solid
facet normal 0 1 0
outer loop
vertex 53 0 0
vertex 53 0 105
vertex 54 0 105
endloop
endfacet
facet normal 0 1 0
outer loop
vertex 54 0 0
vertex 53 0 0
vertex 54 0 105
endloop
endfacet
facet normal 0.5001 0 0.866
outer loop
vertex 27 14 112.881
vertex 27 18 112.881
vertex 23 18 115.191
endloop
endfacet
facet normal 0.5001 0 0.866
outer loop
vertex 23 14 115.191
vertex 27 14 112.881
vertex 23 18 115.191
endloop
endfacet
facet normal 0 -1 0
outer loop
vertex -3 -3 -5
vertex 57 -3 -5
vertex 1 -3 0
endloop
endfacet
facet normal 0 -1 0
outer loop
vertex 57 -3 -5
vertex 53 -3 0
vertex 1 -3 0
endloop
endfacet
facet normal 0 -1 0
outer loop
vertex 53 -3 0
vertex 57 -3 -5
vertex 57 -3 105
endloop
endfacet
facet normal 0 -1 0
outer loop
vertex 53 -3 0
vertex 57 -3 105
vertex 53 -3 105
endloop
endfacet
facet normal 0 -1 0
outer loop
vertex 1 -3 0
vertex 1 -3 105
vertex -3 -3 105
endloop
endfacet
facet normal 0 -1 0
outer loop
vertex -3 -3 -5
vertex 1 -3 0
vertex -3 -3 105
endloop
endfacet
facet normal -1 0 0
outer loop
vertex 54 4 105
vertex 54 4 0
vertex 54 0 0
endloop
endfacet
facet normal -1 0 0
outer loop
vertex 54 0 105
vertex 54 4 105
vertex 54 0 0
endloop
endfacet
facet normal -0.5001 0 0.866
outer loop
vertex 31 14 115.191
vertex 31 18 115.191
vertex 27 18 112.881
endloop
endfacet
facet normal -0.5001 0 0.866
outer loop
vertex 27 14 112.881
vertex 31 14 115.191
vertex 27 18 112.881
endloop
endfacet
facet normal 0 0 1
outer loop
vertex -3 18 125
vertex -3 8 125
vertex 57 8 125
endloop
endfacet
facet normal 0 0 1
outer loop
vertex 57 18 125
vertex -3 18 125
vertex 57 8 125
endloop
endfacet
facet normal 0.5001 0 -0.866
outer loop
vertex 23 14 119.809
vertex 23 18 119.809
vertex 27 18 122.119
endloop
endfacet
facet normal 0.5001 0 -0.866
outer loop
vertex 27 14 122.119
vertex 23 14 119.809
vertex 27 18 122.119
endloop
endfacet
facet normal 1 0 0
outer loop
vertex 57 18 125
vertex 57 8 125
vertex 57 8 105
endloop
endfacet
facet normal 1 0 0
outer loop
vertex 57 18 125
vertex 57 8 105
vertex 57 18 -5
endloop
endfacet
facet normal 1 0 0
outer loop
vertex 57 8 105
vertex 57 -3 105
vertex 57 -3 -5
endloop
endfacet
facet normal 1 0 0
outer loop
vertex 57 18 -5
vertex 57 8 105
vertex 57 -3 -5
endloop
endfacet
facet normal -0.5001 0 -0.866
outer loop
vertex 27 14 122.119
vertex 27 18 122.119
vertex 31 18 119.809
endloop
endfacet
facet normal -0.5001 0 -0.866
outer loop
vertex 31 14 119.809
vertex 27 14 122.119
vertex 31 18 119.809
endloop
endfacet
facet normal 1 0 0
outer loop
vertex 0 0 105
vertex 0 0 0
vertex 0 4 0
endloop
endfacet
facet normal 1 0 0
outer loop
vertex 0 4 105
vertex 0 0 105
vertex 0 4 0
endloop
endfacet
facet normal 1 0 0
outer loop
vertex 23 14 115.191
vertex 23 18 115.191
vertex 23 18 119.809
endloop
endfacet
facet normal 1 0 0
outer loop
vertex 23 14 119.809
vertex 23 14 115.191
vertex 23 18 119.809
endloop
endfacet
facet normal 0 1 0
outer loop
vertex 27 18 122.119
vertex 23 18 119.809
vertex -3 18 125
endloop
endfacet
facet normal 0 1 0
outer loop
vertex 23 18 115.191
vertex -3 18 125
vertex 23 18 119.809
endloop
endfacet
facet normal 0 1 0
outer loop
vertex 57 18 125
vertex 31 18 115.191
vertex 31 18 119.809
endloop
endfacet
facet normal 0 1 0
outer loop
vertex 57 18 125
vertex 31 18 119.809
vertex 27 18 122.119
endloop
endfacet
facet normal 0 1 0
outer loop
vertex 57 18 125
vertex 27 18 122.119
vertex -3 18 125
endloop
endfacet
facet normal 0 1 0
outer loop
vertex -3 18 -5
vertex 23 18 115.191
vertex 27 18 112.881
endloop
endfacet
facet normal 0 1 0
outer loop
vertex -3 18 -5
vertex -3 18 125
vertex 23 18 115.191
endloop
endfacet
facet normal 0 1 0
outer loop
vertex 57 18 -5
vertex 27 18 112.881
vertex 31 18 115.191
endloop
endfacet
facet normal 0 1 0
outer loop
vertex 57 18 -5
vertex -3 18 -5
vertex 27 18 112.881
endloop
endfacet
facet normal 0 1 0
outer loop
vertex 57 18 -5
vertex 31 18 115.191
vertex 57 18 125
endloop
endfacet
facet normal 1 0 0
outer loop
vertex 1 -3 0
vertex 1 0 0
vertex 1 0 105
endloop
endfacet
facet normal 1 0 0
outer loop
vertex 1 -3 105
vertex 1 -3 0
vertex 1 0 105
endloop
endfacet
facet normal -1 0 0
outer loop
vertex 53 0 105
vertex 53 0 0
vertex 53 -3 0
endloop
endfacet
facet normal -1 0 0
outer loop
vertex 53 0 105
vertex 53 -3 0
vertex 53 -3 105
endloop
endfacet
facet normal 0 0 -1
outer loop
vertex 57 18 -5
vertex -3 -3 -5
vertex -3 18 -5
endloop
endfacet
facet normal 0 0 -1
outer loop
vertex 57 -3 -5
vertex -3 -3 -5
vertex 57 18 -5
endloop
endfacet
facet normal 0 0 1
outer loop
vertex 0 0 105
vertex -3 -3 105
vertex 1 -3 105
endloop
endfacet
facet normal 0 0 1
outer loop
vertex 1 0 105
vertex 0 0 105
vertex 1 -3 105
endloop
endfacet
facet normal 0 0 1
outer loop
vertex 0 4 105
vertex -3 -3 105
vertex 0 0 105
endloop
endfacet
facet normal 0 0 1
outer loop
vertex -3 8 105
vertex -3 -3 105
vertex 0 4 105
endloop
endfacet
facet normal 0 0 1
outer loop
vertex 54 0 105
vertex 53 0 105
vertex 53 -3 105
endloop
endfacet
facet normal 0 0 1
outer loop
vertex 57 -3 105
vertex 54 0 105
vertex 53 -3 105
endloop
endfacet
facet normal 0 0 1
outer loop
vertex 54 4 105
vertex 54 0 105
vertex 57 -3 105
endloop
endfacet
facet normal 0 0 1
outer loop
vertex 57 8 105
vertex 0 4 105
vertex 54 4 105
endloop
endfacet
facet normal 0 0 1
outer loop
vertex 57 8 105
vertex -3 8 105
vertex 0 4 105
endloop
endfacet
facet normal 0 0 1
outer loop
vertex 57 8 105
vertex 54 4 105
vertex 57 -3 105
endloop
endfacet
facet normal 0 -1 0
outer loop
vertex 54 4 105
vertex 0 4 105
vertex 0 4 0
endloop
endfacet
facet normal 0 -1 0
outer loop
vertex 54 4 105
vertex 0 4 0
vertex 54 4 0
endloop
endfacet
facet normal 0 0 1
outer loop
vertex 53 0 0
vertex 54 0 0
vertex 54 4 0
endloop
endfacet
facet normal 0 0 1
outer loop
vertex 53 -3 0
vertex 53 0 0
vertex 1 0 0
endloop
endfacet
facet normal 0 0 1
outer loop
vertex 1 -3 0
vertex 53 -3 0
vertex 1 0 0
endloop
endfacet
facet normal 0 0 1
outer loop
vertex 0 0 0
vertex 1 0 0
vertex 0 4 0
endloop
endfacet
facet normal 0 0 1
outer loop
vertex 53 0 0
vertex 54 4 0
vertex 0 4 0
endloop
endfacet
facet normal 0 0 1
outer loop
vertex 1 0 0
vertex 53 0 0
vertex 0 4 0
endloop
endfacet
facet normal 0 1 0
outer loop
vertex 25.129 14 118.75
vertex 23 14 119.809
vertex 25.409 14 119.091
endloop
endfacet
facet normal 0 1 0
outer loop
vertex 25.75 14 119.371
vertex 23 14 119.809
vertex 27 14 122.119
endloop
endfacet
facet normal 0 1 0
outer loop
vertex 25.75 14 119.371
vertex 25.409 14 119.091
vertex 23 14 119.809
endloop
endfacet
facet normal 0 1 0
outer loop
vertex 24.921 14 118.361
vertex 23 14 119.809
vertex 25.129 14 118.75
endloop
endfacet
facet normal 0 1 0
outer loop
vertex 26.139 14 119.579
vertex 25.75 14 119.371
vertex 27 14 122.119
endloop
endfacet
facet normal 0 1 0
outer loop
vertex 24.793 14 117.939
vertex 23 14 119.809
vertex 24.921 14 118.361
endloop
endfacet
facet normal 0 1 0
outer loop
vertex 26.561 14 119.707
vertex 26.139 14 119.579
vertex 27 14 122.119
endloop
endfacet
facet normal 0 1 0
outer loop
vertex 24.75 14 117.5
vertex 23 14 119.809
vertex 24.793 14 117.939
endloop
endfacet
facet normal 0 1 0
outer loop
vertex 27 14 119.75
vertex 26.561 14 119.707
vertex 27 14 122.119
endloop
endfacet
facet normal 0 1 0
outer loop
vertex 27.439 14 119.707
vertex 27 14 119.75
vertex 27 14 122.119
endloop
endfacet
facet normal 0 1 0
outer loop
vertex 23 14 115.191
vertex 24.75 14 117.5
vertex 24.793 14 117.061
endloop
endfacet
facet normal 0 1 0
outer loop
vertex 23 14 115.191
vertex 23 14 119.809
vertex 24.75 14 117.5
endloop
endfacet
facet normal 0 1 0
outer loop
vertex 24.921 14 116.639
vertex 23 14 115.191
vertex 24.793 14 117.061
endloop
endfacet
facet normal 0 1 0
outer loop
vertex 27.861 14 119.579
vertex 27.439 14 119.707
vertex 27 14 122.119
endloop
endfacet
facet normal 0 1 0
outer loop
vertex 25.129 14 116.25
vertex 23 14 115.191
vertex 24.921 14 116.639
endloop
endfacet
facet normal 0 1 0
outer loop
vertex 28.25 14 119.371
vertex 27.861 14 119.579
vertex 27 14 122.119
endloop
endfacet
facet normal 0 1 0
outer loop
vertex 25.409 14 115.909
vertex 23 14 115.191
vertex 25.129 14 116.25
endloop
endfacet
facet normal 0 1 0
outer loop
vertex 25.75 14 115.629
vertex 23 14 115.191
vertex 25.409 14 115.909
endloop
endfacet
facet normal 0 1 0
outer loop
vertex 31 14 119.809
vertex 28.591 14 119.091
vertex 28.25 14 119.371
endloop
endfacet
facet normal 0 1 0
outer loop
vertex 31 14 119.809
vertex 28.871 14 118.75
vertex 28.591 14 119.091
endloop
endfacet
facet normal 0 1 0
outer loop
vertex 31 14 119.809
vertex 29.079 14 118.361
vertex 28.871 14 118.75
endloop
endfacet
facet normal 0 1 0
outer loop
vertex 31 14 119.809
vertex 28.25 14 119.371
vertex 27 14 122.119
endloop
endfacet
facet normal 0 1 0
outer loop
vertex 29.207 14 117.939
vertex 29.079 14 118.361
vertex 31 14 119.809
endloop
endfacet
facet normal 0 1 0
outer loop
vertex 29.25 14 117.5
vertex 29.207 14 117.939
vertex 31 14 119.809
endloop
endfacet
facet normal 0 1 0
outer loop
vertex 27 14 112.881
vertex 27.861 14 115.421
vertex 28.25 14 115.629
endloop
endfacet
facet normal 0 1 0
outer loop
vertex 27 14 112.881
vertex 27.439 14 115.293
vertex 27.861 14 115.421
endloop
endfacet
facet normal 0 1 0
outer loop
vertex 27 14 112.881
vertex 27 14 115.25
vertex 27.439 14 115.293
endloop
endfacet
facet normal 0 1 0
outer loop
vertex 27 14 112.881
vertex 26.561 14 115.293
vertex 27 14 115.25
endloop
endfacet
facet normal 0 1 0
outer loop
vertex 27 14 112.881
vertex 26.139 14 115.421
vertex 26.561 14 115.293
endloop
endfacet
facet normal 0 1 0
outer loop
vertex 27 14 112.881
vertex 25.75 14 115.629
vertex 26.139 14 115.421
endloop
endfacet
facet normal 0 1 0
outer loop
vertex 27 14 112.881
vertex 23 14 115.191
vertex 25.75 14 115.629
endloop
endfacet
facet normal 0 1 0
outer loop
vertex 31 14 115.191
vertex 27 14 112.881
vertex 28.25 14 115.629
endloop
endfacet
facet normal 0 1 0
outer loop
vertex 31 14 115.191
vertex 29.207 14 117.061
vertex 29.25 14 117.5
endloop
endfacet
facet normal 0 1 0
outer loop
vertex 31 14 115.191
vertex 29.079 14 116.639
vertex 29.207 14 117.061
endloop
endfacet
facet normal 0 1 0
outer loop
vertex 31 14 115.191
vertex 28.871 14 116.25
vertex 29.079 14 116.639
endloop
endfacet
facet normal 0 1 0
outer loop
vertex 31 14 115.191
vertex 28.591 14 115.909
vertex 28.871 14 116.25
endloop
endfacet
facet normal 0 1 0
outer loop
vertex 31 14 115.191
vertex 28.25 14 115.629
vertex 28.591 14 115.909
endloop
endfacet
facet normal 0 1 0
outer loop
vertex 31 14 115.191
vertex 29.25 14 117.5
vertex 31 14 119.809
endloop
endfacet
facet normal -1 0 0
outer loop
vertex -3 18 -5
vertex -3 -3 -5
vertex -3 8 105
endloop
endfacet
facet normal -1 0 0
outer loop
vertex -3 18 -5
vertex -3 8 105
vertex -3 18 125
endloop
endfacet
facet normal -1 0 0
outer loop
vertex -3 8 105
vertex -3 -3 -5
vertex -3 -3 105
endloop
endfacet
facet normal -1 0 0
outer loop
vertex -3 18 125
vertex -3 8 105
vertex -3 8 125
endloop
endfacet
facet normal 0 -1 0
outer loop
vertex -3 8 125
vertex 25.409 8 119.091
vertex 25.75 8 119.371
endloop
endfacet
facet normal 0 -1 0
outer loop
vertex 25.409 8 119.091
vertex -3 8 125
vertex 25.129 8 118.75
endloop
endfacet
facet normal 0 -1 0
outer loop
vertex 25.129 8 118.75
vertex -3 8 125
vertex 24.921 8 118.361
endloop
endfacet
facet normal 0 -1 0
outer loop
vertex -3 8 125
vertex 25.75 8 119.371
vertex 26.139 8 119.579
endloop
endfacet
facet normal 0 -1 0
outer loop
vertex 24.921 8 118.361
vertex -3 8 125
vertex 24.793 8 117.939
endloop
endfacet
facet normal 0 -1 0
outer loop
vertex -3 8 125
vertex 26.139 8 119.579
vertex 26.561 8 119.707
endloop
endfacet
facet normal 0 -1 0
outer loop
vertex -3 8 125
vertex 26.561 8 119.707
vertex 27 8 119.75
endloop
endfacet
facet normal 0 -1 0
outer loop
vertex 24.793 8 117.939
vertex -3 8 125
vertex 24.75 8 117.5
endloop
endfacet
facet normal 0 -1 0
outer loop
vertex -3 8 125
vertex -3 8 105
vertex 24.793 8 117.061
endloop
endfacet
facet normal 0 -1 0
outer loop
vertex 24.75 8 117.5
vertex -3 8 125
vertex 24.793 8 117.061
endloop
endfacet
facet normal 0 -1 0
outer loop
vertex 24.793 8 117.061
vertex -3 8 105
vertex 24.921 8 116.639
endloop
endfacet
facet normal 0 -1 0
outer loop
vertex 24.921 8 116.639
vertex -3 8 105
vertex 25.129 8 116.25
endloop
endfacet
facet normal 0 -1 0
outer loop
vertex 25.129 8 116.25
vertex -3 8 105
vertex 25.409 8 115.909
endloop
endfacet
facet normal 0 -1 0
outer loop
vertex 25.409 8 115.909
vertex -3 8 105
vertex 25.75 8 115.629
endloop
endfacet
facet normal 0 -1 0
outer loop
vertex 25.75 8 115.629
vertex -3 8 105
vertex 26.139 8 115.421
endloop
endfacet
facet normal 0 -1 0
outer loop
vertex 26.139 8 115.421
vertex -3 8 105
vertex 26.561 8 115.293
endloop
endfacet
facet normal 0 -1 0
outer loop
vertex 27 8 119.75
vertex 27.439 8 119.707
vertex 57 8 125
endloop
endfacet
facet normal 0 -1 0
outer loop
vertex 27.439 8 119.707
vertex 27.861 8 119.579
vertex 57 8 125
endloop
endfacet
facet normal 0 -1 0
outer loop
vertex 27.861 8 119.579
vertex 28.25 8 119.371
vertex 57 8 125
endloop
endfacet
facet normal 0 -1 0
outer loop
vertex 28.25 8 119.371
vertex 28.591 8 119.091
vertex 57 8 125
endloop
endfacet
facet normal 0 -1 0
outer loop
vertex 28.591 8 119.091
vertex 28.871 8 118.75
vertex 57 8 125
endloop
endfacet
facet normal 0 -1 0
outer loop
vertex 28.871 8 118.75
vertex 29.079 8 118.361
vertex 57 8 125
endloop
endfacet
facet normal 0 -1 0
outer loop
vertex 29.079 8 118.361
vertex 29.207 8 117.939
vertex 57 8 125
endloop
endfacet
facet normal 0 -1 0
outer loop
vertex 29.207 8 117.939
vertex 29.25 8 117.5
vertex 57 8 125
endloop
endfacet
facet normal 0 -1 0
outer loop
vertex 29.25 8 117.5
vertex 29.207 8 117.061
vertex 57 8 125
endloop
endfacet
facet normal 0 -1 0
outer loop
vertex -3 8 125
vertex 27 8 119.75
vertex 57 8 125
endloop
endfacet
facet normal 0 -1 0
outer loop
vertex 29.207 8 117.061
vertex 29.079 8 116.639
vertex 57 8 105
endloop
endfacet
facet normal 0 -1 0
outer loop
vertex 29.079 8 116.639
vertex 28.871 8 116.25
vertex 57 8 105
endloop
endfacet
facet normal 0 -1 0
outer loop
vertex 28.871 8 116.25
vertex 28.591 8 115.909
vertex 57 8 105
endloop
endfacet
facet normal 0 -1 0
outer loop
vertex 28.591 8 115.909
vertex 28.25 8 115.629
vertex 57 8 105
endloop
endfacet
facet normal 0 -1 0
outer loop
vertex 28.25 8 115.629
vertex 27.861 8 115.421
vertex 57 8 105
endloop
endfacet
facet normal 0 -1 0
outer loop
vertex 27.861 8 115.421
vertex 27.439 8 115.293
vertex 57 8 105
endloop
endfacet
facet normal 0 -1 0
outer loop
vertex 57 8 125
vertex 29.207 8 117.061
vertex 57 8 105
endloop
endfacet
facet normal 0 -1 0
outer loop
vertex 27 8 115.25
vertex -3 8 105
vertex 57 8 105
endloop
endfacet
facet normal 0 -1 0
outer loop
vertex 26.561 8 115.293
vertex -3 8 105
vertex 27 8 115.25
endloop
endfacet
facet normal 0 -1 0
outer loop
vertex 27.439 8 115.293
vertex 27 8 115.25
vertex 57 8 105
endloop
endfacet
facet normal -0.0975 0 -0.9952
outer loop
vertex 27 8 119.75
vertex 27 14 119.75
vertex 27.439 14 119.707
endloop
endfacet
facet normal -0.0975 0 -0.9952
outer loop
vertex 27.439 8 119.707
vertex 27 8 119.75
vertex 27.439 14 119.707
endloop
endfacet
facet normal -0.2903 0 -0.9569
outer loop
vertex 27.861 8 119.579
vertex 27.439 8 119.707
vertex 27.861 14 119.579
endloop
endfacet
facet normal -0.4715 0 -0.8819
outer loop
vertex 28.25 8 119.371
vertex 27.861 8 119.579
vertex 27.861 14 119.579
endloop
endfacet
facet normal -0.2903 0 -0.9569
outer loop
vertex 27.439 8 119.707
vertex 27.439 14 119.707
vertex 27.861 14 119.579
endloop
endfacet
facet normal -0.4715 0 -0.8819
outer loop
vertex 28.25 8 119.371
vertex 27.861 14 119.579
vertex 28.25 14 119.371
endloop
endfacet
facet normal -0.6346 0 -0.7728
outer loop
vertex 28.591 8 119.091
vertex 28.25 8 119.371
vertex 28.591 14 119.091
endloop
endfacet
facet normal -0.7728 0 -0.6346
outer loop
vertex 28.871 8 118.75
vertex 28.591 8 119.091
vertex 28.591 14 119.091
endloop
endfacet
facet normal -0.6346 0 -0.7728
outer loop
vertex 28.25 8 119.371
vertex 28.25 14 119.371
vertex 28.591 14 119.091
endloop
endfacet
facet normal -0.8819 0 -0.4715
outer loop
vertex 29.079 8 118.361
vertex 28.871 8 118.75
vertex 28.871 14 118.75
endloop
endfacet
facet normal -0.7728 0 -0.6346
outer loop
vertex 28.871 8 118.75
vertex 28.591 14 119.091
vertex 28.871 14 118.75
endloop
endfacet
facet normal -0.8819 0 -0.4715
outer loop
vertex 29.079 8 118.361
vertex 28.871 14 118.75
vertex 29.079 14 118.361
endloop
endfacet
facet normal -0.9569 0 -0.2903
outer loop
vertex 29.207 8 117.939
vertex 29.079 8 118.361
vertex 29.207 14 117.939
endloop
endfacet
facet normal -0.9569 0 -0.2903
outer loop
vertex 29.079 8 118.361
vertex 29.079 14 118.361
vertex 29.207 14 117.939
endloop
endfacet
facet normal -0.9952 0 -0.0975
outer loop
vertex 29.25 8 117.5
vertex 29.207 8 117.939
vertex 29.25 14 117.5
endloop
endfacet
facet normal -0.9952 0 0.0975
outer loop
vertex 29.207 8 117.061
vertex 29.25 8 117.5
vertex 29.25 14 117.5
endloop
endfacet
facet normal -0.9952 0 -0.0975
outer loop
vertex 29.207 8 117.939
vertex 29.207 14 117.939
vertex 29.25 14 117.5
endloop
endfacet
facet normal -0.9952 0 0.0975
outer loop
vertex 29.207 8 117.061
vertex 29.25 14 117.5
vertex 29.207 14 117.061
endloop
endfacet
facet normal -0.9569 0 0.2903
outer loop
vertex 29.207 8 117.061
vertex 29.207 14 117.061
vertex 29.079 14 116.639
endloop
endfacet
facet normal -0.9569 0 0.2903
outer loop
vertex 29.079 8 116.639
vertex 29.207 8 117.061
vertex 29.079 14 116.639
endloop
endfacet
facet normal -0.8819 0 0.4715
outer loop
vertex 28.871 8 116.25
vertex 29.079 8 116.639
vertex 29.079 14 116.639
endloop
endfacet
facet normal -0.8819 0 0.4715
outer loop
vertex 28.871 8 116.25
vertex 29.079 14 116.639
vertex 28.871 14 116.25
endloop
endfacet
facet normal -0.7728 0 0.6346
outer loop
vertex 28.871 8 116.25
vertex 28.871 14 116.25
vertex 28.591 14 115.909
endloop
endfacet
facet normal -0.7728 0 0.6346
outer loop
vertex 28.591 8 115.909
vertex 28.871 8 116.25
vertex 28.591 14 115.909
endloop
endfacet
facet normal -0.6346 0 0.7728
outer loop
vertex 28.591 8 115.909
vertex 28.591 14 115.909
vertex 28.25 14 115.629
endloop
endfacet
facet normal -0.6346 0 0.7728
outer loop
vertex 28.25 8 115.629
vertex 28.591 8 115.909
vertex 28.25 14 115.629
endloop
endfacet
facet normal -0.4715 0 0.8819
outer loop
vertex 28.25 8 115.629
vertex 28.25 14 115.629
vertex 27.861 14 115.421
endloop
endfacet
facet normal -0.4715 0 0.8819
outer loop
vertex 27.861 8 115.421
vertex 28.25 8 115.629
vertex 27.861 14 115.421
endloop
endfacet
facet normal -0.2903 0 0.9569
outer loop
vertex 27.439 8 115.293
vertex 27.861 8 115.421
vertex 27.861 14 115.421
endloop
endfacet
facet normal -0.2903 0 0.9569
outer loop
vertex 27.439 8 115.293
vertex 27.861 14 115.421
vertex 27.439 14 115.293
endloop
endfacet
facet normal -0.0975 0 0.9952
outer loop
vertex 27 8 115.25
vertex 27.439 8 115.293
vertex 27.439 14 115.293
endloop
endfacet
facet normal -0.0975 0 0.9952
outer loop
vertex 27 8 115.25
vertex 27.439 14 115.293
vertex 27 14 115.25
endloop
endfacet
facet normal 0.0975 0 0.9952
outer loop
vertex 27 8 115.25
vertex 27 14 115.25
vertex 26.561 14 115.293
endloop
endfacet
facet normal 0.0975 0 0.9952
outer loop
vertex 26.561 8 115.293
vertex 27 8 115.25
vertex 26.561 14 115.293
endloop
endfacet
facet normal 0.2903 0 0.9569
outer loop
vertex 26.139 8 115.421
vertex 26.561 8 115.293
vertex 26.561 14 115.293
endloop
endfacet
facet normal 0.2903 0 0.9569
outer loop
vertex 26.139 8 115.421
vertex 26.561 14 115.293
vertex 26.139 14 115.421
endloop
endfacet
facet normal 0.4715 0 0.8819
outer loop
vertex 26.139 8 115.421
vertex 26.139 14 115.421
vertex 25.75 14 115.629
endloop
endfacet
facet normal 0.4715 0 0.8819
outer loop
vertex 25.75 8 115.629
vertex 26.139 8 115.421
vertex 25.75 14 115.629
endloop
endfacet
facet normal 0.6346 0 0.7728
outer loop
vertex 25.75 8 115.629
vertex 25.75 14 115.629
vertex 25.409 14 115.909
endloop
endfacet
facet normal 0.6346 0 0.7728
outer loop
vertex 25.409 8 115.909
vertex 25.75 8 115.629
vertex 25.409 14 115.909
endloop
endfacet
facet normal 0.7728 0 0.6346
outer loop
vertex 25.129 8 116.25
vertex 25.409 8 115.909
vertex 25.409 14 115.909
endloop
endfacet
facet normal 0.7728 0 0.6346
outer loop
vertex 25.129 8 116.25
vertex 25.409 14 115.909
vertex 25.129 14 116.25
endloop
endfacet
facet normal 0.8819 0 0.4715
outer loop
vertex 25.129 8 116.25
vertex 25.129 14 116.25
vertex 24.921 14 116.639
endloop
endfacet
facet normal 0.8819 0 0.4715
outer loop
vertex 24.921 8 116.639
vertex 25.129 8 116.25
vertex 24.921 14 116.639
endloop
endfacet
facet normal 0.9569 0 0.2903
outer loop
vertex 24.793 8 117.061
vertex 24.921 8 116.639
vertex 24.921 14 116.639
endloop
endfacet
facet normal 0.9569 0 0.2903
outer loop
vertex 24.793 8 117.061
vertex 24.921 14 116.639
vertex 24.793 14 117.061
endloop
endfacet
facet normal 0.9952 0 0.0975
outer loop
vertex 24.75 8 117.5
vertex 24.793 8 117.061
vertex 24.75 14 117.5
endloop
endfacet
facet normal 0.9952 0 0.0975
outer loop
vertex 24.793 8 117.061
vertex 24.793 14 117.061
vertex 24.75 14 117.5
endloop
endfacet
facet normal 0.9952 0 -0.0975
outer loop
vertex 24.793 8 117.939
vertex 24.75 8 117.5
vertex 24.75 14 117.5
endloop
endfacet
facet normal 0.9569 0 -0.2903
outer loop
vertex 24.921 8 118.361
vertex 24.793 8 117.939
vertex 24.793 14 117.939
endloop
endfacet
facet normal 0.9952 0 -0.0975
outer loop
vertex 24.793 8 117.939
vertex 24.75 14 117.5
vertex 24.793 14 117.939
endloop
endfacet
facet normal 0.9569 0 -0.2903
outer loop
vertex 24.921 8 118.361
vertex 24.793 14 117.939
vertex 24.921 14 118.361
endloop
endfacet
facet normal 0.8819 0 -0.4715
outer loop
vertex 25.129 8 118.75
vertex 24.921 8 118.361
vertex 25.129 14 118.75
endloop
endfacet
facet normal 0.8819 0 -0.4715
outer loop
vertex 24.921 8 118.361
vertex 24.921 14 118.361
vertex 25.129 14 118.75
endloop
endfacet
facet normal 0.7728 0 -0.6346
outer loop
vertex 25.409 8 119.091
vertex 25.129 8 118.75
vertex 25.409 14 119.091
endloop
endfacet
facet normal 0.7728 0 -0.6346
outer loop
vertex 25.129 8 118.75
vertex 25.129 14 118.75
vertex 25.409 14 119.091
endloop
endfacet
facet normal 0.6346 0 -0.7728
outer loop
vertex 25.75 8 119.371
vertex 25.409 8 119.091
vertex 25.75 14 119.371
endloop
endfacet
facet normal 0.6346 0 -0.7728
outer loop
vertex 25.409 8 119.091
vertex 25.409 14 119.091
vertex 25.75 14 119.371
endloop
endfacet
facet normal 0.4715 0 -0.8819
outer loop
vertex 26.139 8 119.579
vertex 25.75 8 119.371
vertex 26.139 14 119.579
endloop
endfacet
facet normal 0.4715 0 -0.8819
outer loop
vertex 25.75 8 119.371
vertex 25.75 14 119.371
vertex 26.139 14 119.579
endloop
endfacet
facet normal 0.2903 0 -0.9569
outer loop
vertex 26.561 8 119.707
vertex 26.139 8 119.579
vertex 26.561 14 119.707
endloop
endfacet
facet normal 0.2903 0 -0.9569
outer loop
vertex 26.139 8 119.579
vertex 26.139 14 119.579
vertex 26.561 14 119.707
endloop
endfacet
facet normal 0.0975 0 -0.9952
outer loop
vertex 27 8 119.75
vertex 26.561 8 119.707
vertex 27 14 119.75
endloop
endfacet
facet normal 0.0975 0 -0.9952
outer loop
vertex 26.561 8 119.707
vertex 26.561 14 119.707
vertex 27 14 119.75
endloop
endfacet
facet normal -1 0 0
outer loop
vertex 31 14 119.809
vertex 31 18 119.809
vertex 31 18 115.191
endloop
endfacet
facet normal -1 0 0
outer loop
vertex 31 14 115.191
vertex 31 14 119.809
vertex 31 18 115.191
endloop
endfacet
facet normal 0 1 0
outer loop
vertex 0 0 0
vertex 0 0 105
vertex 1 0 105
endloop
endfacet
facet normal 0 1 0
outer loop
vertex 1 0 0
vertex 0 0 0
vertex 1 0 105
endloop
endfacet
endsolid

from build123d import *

# Parameters (mm, degrees)
EXTRUDE_1_DEPTH     = 105
SKETCH_2_W          = 4
SKETCH_2_H          = 105
EXTRUDE_2_DEPTH     = 3
SKETCH_4_W          = 60
SKETCH_4_H          = 11
EXTRUDE_3_DEPTH     = 5
SKETCH_6_W          = 60
SKETCH_6_H          = 110
SKETCH_6_H_2        = 20
EXTRUDE_4_DEPTH     = 10
CUT_EXTRUDE_1_DEPTH = 4
SKETCH_9_R          = 2.25
CUT_EXTRUDE_2_DEPTH = 139.430487971


with BuildPart() as part:
    # 스케치1 → 보스-돌출1 (new body)
    with BuildSketch(Plane.XY):
        Polygon((-3, 0), (0, 0), (0, 4), (54, 4), (54, 0), (57, 0), (57, 8), (-3, 8), align=None)
    extrude(amount=EXTRUDE_1_DEPTH)

    # 스케치2 → 보스-돌출2 (add)
    with BuildSketch(Plane.XZ):
        with Locations((-1, 52.5)):
            Rectangle(SKETCH_2_W, SKETCH_2_H)
        with Locations((55, 52.5)):
            Rectangle(SKETCH_2_W, SKETCH_2_H)
    extrude(amount=EXTRUDE_2_DEPTH)

    # 스케치4 → 보스-돌출3 (add)
    with BuildSketch(Plane(origin=(0, 0, 0), x_dir=(-1, 0, 0), z_dir=(0, 0, -1))):
        with Locations((-27, 2.5)):
            Rectangle(SKETCH_4_W, SKETCH_4_H)
    extrude(amount=EXTRUDE_3_DEPTH)

    # 스케치6 → 보스-돌출4 (add)
    with BuildSketch(Plane(origin=(0, 8, 0), x_dir=(1, 0, 0), z_dir=(0, 1, 0))):
        with Locations((27, -50)):
            Rectangle(SKETCH_6_W, SKETCH_6_H)
        with Locations((27, -115)):
            Rectangle(SKETCH_6_W, SKETCH_6_H_2)
    extrude(amount=EXTRUDE_4_DEPTH)

    # 스케치8 → 컷-돌출1 (cut)
    with BuildSketch(Plane(origin=(0, 18, 0), x_dir=(1, 0, 0), z_dir=(0, 1, 0))):
        Polygon((23, -115.190598923), (23, -119.809401077), (27, -122.118802154), (31, -119.809401077), (31, -115.190598923), (27, -112.881197846), align=None)
    extrude(amount=-CUT_EXTRUDE_1_DEPTH, mode=Mode.SUBTRACT)

    # 스케치9 → 컷-돌출2 (cut, through all)
    with BuildSketch(Plane(origin=(0, 14, 0), x_dir=(1, 0, 0), z_dir=(0, 1, 0))):
        with Locations(Location((27, -117.5, 0), (0, 0, 270))):
            Circle(SKETCH_9_R)
    extrude(amount=-CUT_EXTRUDE_2_DEPTH, mode=Mode.SUBTRACT)


solid = part.part
